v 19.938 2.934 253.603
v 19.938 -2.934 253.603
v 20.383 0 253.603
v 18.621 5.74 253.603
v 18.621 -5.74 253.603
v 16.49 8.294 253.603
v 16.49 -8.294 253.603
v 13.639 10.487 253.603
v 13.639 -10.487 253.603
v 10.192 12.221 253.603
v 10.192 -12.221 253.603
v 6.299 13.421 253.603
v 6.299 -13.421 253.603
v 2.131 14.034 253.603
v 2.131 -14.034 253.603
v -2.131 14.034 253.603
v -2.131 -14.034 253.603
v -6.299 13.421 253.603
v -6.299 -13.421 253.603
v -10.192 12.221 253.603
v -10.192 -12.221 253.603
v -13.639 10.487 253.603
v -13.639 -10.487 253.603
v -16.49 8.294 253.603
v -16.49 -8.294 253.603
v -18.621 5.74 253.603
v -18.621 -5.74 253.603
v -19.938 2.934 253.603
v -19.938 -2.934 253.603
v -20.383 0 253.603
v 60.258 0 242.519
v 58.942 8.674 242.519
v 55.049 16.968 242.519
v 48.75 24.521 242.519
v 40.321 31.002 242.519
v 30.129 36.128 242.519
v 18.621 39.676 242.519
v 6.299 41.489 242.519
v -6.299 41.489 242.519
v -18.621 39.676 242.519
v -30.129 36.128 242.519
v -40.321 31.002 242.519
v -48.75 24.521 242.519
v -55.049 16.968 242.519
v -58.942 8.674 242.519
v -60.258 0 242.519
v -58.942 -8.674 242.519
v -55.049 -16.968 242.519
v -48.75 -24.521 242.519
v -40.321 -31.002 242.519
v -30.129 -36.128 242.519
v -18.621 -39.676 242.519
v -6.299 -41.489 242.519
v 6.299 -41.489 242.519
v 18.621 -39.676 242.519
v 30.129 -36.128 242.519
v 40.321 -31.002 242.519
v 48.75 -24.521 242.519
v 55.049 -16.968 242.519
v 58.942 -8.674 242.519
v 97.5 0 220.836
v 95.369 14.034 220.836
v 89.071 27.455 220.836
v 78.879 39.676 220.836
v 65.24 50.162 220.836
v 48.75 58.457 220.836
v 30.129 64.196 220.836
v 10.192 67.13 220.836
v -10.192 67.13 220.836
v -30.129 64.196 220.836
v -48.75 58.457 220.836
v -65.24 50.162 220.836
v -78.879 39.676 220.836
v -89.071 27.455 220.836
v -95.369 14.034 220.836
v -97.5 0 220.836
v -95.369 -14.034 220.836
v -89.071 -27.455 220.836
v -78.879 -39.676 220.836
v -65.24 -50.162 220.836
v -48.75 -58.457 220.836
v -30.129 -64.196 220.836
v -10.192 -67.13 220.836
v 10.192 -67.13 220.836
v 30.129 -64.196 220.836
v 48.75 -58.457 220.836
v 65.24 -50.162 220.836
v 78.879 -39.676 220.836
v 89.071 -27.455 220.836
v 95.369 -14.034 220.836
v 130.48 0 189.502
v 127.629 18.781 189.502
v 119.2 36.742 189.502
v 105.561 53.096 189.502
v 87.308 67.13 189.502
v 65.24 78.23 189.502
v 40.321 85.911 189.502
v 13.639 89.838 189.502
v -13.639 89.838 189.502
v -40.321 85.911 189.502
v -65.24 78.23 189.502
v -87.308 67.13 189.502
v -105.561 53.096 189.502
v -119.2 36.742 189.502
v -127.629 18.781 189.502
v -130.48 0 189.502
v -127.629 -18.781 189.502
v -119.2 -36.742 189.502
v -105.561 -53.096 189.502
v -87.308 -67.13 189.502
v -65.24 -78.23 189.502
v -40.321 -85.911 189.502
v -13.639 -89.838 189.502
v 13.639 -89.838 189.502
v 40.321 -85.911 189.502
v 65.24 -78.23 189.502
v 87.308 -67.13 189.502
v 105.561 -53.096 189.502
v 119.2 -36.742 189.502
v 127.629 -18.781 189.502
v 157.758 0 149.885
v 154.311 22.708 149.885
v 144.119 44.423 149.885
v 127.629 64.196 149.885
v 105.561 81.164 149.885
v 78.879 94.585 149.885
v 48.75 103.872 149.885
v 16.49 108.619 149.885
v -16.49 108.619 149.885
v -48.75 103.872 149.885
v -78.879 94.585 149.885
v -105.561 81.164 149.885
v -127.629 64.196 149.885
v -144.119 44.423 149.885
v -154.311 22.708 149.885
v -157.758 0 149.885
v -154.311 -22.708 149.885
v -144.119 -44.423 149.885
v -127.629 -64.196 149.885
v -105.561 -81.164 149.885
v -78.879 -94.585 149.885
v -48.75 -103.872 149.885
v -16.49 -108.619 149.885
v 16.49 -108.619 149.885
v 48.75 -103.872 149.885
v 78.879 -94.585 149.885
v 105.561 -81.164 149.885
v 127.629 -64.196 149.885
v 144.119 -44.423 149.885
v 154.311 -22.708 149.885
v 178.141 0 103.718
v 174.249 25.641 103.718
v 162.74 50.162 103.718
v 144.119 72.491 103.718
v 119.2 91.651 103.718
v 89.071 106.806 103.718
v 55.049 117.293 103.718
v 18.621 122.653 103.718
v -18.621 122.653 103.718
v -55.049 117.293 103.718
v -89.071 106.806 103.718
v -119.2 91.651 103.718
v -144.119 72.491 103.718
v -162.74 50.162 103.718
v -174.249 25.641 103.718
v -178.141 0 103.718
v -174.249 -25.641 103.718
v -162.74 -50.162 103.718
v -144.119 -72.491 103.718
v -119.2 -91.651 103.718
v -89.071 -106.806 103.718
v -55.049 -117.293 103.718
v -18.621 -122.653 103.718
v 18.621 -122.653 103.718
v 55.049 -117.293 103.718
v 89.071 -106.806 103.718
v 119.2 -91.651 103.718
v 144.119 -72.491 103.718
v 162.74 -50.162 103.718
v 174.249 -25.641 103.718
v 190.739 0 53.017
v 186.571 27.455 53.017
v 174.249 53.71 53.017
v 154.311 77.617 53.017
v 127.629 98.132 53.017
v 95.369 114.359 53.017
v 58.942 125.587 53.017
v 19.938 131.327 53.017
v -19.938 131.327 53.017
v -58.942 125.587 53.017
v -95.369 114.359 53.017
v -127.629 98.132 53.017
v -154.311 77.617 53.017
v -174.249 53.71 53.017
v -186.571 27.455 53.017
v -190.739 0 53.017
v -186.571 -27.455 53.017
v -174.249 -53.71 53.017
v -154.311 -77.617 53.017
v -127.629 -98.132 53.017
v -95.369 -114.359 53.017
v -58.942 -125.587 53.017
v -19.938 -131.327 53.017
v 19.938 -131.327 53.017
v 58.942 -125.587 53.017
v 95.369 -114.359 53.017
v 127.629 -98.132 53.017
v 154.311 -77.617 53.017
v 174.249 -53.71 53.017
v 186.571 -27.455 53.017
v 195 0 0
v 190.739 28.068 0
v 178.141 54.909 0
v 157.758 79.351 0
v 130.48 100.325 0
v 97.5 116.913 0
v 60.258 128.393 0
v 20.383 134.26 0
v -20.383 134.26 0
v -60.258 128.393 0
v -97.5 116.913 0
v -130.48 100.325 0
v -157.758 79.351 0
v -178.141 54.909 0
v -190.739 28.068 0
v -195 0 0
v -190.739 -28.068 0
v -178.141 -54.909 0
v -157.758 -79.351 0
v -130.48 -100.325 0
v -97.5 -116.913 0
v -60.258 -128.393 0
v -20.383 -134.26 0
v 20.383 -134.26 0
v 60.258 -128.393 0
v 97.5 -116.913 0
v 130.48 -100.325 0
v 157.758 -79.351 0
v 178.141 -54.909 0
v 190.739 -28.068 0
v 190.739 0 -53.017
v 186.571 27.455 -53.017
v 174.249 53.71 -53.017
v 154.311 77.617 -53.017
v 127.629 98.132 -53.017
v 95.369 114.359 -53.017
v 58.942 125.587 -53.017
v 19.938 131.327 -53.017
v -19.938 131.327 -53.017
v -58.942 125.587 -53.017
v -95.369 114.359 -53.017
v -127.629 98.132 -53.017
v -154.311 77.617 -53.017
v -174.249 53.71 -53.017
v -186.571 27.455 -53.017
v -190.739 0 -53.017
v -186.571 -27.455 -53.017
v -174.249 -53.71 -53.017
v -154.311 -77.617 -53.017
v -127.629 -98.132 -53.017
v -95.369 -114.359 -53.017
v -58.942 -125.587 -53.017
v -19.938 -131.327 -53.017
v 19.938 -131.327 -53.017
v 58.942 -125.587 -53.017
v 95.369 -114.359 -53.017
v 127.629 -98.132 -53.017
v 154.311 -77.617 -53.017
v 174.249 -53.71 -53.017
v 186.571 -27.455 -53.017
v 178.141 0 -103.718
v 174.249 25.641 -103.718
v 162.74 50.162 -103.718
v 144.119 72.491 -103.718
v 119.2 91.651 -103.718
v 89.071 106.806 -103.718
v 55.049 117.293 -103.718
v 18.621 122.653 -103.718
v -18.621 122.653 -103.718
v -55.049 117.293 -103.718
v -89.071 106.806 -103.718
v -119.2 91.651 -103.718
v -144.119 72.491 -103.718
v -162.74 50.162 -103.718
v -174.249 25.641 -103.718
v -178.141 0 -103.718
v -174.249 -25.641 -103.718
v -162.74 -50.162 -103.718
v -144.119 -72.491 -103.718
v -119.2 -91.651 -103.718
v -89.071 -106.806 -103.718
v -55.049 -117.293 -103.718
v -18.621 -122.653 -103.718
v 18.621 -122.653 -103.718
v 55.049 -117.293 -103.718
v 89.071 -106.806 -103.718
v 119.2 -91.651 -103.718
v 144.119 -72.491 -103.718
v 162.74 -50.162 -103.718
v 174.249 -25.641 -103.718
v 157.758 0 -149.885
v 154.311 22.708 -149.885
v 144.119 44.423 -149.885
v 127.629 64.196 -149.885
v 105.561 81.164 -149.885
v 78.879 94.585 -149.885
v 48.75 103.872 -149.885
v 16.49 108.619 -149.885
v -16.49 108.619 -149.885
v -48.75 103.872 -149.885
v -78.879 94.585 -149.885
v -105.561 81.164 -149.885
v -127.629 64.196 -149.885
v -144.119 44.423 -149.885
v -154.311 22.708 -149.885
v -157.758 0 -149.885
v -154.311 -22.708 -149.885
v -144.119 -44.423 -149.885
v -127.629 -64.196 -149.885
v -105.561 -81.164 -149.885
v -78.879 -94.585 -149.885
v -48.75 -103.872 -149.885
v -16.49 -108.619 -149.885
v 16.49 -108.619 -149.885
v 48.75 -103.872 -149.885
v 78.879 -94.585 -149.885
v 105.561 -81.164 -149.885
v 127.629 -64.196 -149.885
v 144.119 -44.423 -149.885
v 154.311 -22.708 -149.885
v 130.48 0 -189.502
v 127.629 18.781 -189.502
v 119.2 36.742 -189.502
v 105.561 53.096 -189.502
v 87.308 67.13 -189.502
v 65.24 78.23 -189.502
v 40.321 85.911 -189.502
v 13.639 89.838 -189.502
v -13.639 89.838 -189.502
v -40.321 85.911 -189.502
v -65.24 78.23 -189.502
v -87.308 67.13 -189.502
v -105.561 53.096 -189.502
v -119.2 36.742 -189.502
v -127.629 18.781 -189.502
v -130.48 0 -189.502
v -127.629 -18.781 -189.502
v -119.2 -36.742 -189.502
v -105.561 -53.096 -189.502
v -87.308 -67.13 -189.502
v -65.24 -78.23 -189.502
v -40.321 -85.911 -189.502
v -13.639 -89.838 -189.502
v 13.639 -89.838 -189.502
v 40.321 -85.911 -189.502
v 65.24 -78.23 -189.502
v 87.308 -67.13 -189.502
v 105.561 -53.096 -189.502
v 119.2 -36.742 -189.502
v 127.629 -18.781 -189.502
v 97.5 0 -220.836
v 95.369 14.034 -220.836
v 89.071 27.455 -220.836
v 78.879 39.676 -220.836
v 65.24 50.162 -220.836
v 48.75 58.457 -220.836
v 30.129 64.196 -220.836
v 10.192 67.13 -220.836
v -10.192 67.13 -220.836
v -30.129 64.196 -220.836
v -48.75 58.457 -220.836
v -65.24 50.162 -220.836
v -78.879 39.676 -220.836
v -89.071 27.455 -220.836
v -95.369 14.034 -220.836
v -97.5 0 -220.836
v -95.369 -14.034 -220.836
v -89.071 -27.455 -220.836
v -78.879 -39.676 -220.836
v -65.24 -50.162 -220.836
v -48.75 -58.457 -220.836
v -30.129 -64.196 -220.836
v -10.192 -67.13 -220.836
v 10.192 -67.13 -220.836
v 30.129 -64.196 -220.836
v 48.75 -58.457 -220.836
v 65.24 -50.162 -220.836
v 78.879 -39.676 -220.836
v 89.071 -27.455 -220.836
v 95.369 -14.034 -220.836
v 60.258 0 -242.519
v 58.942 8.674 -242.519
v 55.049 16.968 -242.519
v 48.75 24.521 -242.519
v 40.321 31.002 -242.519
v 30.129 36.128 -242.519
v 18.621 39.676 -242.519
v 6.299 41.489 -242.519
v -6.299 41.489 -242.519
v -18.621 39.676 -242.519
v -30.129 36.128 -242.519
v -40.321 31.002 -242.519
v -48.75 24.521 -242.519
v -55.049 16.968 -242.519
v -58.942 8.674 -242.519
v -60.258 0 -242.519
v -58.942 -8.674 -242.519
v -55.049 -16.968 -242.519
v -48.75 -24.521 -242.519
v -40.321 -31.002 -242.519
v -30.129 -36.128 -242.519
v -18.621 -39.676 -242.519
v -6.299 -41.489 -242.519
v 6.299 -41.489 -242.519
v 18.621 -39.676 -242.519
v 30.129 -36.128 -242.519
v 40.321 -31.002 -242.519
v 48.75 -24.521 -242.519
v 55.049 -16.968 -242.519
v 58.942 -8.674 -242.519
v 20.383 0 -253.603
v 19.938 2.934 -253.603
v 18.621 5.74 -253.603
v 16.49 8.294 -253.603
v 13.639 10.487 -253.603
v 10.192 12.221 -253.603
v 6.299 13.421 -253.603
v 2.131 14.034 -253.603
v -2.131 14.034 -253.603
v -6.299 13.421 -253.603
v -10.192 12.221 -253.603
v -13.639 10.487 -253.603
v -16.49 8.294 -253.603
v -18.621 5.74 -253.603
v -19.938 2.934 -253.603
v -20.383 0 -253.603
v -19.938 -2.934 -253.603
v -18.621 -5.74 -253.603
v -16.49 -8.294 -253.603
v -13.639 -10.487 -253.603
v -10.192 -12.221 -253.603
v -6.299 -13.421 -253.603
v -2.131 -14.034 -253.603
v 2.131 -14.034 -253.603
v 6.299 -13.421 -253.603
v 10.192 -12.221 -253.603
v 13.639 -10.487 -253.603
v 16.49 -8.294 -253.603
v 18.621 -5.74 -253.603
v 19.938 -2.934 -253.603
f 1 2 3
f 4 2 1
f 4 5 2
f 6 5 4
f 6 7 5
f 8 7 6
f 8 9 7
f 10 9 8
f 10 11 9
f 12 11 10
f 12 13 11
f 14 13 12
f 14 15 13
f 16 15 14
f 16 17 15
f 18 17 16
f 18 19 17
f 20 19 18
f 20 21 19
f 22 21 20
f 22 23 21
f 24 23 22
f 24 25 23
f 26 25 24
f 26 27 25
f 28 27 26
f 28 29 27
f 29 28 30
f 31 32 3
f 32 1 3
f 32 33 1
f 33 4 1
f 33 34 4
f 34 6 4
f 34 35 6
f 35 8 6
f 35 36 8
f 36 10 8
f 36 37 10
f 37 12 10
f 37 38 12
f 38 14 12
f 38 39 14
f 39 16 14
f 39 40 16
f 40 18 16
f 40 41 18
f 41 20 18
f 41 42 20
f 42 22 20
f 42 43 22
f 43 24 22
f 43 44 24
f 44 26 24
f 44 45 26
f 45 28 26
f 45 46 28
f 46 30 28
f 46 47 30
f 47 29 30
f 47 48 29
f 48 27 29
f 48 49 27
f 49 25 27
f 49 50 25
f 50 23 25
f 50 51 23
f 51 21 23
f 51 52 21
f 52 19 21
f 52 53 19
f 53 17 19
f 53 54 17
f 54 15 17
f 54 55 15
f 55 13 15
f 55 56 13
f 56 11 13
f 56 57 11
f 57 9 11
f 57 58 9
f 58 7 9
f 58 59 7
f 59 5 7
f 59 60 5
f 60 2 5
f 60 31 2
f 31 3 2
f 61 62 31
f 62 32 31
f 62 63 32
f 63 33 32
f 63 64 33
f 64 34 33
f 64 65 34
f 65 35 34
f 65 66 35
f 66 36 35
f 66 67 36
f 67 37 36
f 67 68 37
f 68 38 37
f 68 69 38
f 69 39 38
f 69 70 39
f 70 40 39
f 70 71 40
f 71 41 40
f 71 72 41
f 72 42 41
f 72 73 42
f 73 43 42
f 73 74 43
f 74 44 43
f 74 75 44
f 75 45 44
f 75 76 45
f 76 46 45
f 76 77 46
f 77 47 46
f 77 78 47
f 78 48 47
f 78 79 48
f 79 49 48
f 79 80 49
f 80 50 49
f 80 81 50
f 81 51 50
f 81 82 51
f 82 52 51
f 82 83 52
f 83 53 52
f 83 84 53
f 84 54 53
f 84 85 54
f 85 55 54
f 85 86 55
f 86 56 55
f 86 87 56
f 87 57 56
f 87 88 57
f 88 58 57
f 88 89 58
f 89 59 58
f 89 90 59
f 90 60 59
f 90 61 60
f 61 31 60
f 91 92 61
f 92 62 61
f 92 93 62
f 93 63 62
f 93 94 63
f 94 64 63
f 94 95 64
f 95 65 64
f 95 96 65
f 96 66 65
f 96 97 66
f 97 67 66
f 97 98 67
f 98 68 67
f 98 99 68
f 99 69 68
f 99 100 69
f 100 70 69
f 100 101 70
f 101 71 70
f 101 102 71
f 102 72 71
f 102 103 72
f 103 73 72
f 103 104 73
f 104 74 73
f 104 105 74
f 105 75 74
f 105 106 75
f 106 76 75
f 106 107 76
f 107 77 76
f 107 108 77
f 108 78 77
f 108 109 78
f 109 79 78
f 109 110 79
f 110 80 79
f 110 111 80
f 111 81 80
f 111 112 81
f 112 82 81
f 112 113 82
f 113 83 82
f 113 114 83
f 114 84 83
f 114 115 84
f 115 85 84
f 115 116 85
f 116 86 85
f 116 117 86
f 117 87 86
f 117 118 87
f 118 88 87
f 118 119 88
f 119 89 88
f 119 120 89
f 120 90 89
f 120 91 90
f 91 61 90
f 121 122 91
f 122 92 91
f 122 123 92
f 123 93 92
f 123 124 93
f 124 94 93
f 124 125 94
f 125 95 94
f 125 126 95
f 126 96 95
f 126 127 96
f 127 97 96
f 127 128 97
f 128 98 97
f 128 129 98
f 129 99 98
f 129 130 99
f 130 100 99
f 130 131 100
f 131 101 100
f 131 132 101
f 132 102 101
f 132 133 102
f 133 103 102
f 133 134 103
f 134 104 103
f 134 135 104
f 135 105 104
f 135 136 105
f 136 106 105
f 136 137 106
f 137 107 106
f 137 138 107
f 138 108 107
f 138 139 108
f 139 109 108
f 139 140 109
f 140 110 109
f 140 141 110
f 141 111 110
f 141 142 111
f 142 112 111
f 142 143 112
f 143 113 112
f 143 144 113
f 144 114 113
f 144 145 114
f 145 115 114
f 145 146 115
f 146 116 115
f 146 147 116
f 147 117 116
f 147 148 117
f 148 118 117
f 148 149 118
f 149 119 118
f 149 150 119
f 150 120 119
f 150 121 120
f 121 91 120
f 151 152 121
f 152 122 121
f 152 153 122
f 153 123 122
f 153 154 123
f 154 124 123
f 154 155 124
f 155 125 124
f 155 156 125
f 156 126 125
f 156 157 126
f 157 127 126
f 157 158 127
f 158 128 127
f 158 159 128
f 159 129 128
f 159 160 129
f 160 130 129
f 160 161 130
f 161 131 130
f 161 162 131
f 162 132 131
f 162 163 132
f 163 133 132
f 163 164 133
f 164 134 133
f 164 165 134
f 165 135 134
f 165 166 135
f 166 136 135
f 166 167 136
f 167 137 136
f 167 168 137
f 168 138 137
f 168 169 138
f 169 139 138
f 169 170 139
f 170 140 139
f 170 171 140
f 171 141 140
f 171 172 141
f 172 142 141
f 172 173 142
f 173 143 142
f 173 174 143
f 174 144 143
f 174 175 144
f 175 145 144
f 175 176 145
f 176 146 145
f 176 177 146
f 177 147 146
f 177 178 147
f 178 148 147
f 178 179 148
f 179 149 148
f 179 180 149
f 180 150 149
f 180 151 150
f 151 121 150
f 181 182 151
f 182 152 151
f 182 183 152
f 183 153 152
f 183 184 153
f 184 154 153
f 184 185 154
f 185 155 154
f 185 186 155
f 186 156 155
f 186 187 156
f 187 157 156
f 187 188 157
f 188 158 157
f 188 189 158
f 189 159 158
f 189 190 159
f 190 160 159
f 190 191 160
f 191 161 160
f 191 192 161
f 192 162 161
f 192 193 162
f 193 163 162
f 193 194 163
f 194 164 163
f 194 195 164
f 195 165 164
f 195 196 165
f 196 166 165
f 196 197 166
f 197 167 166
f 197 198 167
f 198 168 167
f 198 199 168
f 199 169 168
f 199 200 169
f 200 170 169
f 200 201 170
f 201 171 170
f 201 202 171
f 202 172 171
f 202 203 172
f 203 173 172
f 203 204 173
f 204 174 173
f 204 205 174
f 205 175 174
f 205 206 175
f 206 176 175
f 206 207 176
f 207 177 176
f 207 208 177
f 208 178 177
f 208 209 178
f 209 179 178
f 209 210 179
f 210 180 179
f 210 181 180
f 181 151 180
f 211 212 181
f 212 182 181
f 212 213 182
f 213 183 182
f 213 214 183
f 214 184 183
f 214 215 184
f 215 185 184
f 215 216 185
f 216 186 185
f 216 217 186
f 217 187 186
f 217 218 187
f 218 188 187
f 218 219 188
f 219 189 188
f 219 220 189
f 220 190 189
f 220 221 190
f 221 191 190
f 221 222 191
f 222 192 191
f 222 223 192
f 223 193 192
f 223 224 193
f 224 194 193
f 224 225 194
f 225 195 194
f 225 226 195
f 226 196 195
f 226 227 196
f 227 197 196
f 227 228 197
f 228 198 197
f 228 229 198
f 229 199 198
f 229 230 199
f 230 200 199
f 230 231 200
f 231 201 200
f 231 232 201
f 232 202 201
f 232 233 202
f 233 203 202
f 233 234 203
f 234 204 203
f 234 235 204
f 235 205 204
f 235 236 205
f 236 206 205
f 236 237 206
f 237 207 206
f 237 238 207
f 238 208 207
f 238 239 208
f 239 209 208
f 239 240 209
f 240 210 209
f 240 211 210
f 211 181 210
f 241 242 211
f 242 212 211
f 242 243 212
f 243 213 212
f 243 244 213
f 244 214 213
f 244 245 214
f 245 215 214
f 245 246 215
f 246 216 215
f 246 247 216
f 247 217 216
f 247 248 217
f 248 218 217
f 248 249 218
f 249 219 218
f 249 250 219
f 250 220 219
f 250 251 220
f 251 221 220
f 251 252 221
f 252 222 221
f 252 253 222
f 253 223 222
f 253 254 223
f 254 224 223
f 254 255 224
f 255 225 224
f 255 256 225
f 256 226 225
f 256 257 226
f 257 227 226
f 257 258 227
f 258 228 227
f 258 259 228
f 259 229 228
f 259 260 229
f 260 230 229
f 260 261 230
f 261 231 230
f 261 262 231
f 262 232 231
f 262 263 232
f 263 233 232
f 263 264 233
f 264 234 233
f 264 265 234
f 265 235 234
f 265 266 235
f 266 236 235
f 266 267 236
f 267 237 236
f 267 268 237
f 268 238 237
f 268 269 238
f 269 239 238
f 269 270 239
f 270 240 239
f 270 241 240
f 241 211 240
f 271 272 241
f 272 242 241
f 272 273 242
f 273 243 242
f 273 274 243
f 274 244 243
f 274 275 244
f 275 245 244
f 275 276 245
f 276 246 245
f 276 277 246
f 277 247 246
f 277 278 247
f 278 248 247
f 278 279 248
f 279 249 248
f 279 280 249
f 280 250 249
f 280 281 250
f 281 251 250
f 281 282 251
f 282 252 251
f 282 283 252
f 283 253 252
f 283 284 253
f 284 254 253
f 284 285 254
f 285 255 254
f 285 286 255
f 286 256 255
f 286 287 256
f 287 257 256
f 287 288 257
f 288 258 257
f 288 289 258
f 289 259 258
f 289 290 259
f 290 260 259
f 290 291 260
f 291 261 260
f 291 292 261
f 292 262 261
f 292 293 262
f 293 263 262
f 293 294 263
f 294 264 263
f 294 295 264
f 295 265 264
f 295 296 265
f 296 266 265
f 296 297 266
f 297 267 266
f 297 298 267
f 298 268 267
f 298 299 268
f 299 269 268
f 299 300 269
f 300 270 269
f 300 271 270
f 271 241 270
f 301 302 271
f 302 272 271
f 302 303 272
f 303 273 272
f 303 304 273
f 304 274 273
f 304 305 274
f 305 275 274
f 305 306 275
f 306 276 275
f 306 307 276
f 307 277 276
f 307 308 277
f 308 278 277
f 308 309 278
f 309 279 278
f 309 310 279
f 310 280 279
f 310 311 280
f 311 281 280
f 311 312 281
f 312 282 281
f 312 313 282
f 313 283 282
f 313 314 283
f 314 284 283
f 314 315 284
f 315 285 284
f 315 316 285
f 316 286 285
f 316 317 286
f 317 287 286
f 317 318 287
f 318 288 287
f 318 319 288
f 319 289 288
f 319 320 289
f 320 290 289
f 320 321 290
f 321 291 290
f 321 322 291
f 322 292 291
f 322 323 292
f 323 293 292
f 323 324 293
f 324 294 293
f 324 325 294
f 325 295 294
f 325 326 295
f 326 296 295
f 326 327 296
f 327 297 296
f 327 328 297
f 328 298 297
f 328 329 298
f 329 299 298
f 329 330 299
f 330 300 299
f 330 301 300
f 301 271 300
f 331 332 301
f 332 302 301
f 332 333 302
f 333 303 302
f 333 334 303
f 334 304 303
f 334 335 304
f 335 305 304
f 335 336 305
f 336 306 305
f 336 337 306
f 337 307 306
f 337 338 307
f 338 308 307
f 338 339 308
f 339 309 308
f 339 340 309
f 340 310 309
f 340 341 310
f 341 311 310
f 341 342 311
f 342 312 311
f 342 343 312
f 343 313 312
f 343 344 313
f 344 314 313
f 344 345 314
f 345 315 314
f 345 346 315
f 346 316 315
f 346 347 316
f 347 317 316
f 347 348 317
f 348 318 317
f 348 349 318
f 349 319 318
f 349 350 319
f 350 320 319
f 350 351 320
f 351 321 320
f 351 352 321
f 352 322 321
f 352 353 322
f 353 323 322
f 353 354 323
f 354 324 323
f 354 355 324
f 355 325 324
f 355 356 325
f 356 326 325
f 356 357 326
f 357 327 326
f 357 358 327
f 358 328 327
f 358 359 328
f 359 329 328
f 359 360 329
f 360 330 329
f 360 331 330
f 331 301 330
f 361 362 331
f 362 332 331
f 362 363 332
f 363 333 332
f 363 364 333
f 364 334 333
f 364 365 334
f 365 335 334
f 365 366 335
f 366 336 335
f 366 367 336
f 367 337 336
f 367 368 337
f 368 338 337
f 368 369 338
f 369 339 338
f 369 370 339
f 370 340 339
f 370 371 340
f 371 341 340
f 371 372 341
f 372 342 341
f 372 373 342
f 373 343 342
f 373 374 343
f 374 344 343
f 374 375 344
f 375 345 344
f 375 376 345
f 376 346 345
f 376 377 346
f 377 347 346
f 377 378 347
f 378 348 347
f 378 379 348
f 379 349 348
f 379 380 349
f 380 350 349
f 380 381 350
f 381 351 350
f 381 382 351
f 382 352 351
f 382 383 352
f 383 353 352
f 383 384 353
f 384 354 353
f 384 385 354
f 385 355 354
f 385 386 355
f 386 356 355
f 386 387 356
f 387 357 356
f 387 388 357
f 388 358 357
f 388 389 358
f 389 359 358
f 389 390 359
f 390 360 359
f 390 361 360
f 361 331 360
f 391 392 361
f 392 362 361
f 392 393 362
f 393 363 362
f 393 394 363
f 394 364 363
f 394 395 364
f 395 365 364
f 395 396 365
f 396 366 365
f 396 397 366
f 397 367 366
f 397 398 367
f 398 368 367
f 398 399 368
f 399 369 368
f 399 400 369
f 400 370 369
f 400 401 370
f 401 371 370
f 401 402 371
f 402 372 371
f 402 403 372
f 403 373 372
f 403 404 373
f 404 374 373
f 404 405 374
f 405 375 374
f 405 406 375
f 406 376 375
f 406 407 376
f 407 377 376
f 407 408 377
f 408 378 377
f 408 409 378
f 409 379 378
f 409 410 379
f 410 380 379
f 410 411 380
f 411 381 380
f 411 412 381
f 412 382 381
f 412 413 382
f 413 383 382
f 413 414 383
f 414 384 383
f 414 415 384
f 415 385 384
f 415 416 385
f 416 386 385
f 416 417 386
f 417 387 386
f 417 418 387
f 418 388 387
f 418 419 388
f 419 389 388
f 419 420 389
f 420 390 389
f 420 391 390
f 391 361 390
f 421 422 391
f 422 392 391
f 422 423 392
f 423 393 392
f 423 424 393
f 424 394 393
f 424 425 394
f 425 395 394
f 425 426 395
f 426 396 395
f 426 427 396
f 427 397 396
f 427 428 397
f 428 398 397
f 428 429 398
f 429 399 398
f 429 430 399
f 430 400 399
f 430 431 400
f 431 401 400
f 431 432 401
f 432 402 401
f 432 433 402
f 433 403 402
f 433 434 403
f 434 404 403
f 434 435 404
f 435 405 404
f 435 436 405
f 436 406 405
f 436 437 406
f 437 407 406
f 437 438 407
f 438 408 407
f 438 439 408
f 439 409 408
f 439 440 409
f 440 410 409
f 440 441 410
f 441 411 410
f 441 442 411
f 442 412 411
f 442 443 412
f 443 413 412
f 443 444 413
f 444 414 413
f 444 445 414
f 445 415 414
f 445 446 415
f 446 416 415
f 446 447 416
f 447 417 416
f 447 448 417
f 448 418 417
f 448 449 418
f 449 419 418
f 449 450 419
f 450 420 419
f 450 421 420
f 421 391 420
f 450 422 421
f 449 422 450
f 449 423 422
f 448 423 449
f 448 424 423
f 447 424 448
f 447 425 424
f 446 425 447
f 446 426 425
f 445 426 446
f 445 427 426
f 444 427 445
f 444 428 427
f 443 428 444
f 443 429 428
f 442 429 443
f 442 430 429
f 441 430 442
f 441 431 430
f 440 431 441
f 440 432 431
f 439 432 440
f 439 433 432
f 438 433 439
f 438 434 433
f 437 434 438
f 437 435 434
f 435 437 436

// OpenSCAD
// Generated by SolidPython 1.0.1 on 2020-07-29 00:46:50


scale(v = [13, 9, 17]) {
	sphere(r = 15);
}
/***********************************************
*********      SolidPython code:      **********
************************************************
 
# import packages: SolidPython
from solid import *
from solid.utils import *
from itertools import chain, combinations, permutations


class Resize:

    def __init__(self, scad_file):
        self.scad_file = scad_file
        #self.scad_file = import_scad(scad_file)
        # cone/cylinder param:
        self.r1 = 0
        self.r2 = 0
        self.h = 0
        # rectangular prism param:
        self.w = 0
        self.l = 0
        # ellipse param:
        self.r = 0

    # import OpenScad code (file name corresponds to shape)


    # classify shape + parameters
    def assign(self, param1, param2, param3):
        if self.scad_file == 'cone.scad':
            self.r1 = param1
            self.r2 = param2
            self.h = param3
        elif self.scad_file == 'cylinder.scad':
            self.r1 = param1
            self.r2 = param2
            self.h = param3
        elif self.scad_file == 'rectangularPrism.scad':
            self.h = param1
            self.l = param2
            self.w = param3
        else:
            self.r = param1
            self.h = param2

    # resize parameters
    def iterate(self):
        x = range(3, 20, 2)
        i = 1
        if self.scad_file == 'cone.scad':
            tempList = list(permutations(x, 2))
            for temp in tempList:
                param1 = temp[0]
                param2 = temp[1]
                filepath = 'produced_scad_files/' + 'cone' + str(param1) + '_' + str(param2) + '_' + '.scad'
                scad_render_to_file(cylinder(h=param1, r1=param2, r2=0), filepath)

        elif self.scad_file == 'cylinder.scad':
            tempList = list(permutations(x, 3))
            for temp in tempList:
                param1 = temp[0]
                param2 = temp[1]
                filepath = 'produced_scad_files/' + 'cylinder' + str(param1) + '_' + str(param2) + '_' + '.scad'
                scad_render_to_file(cylinder(h=param1, r1=param2, r2=param2), filepath)

        elif self.scad_file == 'rectangularPrism.scad':
            tempList = list(permutations(x, 3))
            for temp in tempList:
                param1 = temp[0]
                param2 = temp[1]
                param3 = temp[2]
                filepath = 'produced_scad_files/' + 'rectangularPrism' + str(param1) + '_' + str(param2) + '_' + str(
                    param3) + '.scad'
                scad_render_to_file(cube(size=(param1, param2, param3)), filepath)

        elif self.scad_file == 'ellipse.scad':
            tempList = list(permutations(x, 4))
            for temp in tempList:
                param1 = temp[0]
                param2 = temp[1]
                param3 = temp[2]
                param4 = temp[3]
                filepath = 'produced_scad_files/' + 'ellipse' + str(param1) + '_' + str(param2) + '_' + str(param3) + '_' + str(param4) + '.scad'
                scad_render_to_file(scale([param1, param2, param3])(sphere(r=param4)), filepath)

    def render_to_scadfile(self):
        scad_render_to_file(scad, 'example.scad') 
 
************************************************/
